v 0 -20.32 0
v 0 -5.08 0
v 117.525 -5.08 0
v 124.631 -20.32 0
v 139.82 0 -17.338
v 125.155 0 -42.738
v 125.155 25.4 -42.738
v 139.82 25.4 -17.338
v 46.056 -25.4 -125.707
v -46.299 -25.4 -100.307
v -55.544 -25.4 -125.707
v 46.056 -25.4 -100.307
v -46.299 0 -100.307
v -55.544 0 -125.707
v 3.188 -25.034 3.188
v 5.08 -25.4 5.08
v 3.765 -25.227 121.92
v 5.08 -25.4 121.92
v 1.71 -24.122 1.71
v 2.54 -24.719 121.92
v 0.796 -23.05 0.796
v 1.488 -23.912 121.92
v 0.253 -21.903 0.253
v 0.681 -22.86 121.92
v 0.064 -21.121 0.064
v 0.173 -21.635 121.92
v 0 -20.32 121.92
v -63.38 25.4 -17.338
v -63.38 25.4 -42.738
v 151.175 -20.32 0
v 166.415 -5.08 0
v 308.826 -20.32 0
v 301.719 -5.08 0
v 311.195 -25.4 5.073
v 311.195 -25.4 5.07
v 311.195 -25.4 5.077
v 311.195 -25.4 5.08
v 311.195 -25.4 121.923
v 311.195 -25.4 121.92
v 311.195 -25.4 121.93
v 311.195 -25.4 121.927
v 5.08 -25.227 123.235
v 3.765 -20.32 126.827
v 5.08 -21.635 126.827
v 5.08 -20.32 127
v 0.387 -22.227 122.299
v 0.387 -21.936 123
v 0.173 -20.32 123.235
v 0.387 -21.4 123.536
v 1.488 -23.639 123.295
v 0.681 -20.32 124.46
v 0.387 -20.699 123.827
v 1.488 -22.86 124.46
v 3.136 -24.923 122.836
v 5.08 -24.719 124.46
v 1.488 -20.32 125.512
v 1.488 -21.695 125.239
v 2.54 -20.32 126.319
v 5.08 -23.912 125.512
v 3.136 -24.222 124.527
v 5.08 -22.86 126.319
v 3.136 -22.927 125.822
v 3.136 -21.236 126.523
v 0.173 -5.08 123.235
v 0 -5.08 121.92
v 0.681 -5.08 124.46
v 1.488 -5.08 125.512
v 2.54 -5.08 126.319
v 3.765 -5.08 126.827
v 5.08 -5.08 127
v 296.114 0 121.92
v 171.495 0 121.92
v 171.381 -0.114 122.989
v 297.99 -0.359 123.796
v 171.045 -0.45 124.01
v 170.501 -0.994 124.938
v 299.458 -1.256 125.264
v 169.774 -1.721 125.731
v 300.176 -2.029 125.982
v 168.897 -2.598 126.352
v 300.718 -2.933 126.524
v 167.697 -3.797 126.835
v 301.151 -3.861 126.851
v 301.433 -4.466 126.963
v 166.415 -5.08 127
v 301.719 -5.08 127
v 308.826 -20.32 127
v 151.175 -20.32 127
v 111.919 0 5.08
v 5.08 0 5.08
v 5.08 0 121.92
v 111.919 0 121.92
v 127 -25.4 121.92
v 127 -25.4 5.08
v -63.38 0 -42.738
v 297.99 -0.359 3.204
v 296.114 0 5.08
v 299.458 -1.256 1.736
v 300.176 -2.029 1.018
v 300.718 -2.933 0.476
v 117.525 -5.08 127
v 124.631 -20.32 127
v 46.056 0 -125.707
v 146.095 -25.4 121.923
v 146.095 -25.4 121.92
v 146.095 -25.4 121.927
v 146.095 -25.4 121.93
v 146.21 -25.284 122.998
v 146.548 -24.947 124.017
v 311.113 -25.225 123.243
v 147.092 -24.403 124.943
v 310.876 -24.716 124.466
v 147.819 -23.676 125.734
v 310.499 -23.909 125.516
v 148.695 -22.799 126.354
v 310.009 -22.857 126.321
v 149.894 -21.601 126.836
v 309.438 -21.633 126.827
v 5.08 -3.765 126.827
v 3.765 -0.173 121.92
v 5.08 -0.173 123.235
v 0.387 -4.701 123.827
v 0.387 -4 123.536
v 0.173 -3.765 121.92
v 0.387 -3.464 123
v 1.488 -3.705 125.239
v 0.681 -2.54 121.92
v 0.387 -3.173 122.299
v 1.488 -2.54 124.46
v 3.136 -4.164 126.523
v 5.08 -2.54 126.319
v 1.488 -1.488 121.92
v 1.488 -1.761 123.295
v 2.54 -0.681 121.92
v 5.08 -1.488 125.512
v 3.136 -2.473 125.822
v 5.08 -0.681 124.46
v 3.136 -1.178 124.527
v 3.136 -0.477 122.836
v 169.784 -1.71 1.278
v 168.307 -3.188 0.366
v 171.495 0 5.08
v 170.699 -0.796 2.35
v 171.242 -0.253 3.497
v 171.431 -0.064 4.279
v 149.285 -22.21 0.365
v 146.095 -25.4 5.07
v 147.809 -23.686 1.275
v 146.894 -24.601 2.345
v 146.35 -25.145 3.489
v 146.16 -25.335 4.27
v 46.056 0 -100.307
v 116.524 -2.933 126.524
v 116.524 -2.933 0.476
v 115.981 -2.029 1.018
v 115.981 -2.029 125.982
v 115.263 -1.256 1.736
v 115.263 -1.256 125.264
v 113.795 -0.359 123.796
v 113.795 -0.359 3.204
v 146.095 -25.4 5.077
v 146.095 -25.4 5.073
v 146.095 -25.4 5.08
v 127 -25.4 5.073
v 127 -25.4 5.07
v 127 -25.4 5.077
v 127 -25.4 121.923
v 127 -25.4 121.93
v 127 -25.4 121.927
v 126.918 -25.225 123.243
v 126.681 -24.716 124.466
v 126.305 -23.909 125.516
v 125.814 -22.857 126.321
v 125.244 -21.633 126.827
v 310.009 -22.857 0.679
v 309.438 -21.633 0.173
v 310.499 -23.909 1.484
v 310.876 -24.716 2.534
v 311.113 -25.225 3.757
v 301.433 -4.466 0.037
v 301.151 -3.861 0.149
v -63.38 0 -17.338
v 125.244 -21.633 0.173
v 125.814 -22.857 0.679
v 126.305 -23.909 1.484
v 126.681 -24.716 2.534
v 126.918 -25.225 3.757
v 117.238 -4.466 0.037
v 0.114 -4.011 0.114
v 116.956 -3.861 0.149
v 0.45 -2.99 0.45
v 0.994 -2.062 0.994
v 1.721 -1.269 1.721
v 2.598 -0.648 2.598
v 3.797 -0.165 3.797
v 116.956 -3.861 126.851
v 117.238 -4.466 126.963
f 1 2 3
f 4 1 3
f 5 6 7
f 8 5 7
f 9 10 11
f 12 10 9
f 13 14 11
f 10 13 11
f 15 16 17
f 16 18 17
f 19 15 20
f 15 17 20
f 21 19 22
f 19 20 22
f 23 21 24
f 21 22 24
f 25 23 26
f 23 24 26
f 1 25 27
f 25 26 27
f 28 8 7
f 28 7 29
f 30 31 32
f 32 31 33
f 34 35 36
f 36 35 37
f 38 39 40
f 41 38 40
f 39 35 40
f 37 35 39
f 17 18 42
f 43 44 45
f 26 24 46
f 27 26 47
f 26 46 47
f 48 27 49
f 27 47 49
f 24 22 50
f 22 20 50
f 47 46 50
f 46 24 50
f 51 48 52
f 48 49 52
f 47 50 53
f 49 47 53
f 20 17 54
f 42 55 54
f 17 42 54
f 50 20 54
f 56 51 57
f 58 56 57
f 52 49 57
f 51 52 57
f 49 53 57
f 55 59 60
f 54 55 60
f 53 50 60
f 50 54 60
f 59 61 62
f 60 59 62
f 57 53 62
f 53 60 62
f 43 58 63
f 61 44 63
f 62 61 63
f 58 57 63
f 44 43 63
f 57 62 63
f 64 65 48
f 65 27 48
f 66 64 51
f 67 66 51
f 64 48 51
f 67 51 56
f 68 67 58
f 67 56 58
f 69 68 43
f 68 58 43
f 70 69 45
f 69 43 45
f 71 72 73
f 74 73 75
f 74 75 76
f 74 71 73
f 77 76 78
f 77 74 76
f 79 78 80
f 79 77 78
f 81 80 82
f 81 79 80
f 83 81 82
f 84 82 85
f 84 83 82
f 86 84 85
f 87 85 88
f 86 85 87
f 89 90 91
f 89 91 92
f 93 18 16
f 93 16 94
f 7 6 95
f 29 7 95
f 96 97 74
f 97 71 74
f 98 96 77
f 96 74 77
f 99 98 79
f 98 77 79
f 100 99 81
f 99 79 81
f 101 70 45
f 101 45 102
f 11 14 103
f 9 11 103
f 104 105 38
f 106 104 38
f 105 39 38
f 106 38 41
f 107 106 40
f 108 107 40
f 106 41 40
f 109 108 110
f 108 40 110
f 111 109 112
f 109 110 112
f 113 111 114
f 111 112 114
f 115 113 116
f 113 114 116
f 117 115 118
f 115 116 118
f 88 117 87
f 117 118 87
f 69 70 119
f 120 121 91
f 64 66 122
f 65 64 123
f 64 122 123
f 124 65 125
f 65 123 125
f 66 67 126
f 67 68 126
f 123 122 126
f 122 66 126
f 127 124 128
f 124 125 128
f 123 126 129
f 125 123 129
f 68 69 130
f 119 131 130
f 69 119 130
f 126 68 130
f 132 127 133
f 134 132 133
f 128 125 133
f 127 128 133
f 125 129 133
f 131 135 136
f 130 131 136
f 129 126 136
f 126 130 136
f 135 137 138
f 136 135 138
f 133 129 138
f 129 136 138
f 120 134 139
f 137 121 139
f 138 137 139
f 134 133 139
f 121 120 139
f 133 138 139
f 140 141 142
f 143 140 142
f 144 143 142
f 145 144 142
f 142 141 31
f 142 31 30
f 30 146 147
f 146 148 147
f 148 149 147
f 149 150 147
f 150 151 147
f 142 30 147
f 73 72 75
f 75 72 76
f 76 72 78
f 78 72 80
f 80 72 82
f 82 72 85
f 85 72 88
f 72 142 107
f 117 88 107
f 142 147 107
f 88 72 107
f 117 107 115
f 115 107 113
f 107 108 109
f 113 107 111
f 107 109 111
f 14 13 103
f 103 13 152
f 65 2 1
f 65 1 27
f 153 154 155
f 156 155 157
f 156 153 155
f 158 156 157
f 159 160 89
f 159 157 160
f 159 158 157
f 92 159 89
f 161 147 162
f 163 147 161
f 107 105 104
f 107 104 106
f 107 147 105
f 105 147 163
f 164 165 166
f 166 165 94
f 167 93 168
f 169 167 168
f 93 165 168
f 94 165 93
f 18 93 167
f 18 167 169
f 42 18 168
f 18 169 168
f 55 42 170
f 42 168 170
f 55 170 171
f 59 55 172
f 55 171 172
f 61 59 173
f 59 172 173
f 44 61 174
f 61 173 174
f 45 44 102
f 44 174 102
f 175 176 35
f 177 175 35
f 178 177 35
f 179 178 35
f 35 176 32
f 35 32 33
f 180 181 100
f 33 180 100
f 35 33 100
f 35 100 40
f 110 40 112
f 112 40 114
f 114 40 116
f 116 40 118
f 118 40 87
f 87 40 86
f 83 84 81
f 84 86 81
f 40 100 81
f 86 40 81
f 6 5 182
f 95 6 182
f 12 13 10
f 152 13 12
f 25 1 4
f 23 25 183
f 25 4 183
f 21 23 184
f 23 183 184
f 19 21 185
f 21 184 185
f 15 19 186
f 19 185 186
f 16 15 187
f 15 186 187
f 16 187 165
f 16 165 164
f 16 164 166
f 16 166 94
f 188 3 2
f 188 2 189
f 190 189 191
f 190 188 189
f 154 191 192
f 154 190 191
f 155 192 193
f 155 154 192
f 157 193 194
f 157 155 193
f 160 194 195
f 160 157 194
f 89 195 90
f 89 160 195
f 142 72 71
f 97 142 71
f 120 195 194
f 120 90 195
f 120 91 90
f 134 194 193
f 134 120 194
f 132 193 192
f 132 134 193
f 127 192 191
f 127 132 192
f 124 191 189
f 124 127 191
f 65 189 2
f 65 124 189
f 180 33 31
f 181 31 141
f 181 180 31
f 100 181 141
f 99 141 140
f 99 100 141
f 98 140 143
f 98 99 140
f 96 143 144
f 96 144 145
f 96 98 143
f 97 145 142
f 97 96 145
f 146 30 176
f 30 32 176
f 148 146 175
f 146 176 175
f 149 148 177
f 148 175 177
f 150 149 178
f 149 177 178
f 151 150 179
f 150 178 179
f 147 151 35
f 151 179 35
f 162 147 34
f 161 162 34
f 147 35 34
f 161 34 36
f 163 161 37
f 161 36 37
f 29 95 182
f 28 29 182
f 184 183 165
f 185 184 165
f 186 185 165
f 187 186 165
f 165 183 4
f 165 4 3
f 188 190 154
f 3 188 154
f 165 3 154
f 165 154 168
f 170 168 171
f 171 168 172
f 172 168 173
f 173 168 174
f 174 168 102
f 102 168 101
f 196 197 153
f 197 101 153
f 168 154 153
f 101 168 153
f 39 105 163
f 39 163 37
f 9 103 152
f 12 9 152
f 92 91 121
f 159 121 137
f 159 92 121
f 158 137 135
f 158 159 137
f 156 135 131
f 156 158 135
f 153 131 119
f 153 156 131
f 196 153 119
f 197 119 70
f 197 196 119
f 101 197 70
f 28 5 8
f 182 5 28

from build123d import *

# Parameters (mm, degrees)
F0_W      = 127
F0_H      = 127
F1_DEPTH  = 25.4
F2_SIZE2  = 11.844205
F2_SIZE   = 25.39999
F3_W      = 165.1
F3_H      = 127
F4_DEPTH  = 25.4
F5_SIZE2  = 11.844205
F5_SIZE   = 25.39999
F6_SIZE2  = 25.39999
F6_SIZE   = 25.39999
F7_W      = 203.2
F7_H      = 25.4
F8_DEPTH  = 25.4
F9_SIZE2  = 14.664687
F9_SIZE   = 25.39999
F10_R     = 5.08
F10_2_R   = 5.08
F11_W     = 101.6
F11_H     = 25.4
F12_DEPTH = 25.4
F13_SIZE2 = 9.244834
F13_SIZE  = 25.39999


# Not quite as in the source:
# - a fillet or chamfer is up to 0.001 mm smaller than in the source, because OpenCascade refuses the exact size


with BuildPart() as f1:
    # F0 (on Front) → F1 (new body)
    with BuildSketch(Plane.XZ):
        with Locations((63.5, 63.5)):
            Rectangle(F0_W, F0_H)
    extrude(amount=F1_DEPTH)

    # F2 (size 25.4 and 11.8442145171 in the source; OpenCascade refuses exactly that, so slightly less here)
    f2_edges = [f1.edges().sort_by_distance(p)[0] for p in [
        (127, 0, 63.5),
    ]]
    f2_side = f1.faces().sort_by_distance((127, -12.7, 63.5))[0]
    chamfer(f2_edges, length=F2_SIZE, length2=F2_SIZE2, reference=f2_side)

    # F10
    f10_edges = [f1.edges().sort_by_distance(p)[0] for p in [
        (63.5, -25.4, 127),
        (57.577898, 0, 127),
        (0, -25.4, 63.5),
        (0, -12.7, 127),
        (63.5, -25.4, 0),
        (115.155795, 0, 63.5),
        (57.577897, 0, 0),
        (0, 0, 63.5),
    ]]
    fillet(f10_edges, radius=F10_R)


with BuildPart() as f4:
    # F3 (on Front) → F4 (new body)
    with BuildSketch(Plane.XZ):
        with Locations((228.6448437452, 63.5)):
            Rectangle(F3_W, F3_H)
    extrude(amount=F4_DEPTH)

    # F5 (size 25.4 and 11.8442145171 in the source; OpenCascade refuses exactly that, so slightly less here)
    f5_edges = [f4.edges().sort_by_distance(p)[0] for p in [
        (311.194844, 0, 63.5),
    ]]
    f5_side = f4.faces().sort_by_distance((311.194844, -12.7, 63.5))[0]
    chamfer(f5_edges, length=F5_SIZE, length2=F5_SIZE2, reference=f5_side)

    # F6 (size 25.4 and 25.4 in the source; OpenCascade refuses exactly that, so slightly less here)
    f6_edges = [f4.edges().sort_by_distance(p)[0] for p in [
        (146.094844, 0, 63.5),
    ]]
    chamfer(f6_edges, length=F6_SIZE, length2=F6_SIZE2)

    # F10#2
    f10_2_edges = [f4.edges().sort_by_distance(p)[0] for p in [
        (235.422736, 0, 0),
        (299.350639, 0, 63.5),
        (235.422736, 0, 127),
        (228.644844, -25.4, 127),
        (228.644844, -25.4, 0),
    ]]
    fillet(f10_2_edges, radius=F10_2_R)


with BuildPart() as f8:
    # F7 (on face) → F8 (new body)
    with BuildSketch(Plane(origin=(0, 0, 0), x_dir=(-1, 0, 0), z_dir=(0, 1, 0))):
        with Locations((-38.2195329294, -30.0378452635)):
            Rectangle(F7_W, F7_H)
    extrude(amount=F8_DEPTH)

    # F9 (size 25.4 and 14.6646968374 in the source; OpenCascade refuses exactly that, so slightly less here)
    f9_edges = [f8.edges().sort_by_distance(p)[0] for p in [
        (139.819533, 12.7, -42.737845),
    ]]
    f9_side = f8.faces().sort_by_distance((139.819533, 12.7, -30.037845))[0]
    chamfer(f9_edges, length=F9_SIZE, length2=F9_SIZE2, reference=f9_side)


with BuildPart() as f12:
    # F11 (on Front) → F12 (new body)
    with BuildSketch(Plane.XZ):
        with Locations((-4.744283855, -113.0070951225)):
            Rectangle(F11_W, F11_H)
    extrude(amount=F12_DEPTH)

    # F13 (size 25.4 and 9.2448439504 in the source; OpenCascade refuses exactly that, so slightly less here)
    f13_edges = [f12.edges().sort_by_distance(p)[0] for p in [
        (-55.544284, -12.7, -100.307095),
    ]]
    f13_side = f12.faces().sort_by_distance((-55.544284, -12.7, -113.007095))[0]
    chamfer(f13_edges, length=F13_SIZE, length2=F13_SIZE2, reference=f13_side)


solid = Compound([f1.part, f4.part, f8.part, f12.part])
